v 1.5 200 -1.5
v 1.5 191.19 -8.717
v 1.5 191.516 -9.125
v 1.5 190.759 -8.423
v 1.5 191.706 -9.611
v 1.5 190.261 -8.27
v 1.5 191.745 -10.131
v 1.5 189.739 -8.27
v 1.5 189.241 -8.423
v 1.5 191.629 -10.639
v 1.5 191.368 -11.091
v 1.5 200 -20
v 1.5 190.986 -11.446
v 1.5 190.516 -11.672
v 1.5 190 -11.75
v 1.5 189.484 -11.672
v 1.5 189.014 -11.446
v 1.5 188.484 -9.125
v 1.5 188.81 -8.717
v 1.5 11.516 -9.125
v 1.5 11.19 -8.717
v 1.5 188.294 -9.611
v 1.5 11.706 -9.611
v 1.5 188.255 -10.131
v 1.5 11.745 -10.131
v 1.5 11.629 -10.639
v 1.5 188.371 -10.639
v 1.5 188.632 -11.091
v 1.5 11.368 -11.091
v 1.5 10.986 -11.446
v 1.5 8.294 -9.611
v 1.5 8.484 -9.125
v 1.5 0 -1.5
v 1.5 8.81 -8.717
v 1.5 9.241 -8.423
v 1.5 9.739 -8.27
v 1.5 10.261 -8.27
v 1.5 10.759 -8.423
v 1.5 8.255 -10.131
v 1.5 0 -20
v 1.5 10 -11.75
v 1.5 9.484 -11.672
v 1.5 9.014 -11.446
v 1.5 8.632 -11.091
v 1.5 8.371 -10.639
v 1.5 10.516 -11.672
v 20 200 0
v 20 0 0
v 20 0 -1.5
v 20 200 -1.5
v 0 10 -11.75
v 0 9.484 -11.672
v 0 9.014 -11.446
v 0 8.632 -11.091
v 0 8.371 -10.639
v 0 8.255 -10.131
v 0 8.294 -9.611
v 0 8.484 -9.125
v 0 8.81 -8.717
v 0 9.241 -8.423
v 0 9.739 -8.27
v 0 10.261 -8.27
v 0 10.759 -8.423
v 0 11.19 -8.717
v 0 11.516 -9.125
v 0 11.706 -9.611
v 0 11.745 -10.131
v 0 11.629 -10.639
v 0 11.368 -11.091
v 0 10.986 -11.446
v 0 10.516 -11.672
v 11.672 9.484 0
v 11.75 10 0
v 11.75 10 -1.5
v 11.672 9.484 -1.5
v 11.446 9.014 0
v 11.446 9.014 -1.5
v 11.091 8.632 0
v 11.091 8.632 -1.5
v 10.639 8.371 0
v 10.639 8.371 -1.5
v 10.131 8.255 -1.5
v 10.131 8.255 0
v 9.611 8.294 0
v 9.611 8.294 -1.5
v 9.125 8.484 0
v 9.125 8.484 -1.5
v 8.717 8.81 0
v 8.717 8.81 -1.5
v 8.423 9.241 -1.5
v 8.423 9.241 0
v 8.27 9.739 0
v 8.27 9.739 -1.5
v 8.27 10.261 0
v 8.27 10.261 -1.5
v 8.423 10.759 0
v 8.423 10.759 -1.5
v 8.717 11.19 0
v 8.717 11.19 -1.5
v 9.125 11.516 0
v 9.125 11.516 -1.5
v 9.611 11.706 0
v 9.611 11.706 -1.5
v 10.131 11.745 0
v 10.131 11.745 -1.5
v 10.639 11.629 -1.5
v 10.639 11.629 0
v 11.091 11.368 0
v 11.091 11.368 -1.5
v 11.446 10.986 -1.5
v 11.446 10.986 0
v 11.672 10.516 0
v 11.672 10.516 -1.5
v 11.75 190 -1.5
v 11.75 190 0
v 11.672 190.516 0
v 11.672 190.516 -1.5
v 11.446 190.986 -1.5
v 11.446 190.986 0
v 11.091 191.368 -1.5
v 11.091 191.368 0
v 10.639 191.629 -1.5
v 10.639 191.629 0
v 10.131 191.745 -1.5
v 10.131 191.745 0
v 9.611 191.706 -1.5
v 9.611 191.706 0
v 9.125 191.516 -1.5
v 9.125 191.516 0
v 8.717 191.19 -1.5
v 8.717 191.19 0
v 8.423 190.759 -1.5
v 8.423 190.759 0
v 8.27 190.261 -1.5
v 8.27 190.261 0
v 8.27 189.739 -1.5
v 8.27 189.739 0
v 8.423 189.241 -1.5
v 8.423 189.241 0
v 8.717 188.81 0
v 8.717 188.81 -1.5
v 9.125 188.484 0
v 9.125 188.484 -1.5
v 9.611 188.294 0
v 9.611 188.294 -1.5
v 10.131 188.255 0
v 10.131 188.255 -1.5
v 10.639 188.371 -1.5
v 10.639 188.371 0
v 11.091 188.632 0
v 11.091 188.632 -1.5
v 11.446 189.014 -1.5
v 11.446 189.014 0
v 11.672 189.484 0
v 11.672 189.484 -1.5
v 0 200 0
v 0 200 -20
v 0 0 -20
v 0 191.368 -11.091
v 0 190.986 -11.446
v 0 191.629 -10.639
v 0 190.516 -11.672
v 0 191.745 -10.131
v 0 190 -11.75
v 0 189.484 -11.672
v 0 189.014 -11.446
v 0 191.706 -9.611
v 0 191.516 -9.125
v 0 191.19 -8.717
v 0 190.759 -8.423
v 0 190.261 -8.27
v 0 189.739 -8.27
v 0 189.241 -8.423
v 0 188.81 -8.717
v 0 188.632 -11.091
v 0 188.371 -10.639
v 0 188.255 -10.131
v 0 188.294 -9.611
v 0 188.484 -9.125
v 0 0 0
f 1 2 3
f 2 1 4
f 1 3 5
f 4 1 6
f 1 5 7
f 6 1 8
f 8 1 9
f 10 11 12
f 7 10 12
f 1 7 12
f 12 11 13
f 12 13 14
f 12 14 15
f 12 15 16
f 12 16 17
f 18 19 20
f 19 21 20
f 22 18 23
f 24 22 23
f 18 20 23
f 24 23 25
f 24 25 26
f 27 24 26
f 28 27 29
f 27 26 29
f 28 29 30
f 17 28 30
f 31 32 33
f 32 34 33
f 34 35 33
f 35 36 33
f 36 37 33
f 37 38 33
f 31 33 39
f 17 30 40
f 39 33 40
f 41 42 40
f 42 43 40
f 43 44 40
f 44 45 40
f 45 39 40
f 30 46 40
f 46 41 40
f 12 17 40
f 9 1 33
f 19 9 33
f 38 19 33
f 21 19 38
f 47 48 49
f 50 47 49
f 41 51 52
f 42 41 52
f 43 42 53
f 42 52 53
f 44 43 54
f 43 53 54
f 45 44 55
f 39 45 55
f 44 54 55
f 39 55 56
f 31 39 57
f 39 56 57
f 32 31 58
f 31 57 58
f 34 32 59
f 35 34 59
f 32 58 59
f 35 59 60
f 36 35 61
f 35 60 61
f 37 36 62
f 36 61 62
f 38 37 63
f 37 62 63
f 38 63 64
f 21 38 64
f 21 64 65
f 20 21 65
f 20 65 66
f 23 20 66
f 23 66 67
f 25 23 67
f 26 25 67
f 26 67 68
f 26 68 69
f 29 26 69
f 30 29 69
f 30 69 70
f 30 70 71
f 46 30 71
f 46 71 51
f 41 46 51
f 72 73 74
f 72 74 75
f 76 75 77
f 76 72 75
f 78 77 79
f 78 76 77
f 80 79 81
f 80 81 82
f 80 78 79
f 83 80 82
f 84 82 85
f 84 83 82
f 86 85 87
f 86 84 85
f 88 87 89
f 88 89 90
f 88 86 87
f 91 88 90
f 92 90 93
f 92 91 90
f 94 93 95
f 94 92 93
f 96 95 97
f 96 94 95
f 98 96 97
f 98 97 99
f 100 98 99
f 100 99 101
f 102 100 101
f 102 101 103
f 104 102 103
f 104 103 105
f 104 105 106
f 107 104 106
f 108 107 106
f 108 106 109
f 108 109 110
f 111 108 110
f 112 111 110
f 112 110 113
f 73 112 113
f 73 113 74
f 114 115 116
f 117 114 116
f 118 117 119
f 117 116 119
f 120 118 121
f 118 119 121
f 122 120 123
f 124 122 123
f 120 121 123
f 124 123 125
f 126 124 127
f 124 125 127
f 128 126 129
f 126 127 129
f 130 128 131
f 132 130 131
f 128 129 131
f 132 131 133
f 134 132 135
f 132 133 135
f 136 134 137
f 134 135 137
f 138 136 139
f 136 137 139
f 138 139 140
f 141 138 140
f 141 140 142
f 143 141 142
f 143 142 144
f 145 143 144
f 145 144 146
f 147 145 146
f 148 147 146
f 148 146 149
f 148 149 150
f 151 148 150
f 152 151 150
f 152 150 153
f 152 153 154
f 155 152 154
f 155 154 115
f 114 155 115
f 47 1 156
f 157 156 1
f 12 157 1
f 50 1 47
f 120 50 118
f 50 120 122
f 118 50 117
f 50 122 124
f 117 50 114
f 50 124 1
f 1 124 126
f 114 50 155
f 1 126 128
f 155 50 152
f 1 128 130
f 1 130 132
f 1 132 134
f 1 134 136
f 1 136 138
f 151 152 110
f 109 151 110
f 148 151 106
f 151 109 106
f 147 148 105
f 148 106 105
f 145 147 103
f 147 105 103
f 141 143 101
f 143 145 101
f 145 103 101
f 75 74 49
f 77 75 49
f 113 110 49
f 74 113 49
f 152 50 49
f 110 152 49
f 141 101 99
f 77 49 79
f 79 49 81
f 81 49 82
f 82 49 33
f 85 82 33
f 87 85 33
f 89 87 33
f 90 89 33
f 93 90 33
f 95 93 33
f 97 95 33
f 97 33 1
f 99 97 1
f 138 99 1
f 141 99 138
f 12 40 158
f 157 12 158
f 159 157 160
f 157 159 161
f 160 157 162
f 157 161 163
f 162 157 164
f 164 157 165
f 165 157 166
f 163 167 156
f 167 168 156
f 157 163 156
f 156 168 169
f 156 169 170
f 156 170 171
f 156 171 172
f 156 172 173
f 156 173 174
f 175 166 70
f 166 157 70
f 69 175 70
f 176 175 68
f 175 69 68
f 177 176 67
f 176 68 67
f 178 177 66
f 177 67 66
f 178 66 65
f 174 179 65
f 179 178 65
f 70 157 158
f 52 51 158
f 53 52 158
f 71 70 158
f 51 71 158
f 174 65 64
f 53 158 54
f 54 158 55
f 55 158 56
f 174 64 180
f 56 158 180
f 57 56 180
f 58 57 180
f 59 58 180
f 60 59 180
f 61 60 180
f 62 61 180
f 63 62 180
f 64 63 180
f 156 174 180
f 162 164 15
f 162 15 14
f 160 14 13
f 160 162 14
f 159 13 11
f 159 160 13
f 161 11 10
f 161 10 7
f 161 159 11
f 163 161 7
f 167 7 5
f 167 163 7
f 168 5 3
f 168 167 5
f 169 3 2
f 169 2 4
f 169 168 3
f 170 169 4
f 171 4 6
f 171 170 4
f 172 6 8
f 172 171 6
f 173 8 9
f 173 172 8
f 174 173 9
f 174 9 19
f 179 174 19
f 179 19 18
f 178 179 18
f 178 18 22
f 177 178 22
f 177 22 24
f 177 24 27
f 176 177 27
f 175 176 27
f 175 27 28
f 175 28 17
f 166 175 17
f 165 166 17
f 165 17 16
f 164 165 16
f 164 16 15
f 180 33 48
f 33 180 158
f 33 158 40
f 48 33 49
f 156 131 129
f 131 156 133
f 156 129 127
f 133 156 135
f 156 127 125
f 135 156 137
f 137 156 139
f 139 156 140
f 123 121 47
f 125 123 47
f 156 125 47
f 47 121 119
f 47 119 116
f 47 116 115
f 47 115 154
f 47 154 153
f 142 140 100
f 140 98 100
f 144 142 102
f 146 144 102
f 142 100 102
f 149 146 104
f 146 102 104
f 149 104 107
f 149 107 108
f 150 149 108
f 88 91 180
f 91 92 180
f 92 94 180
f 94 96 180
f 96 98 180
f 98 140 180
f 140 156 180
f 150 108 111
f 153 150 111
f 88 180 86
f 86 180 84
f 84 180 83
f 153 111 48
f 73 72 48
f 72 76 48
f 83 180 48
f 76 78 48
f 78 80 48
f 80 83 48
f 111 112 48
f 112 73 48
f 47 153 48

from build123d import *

# Parameters (mm, degrees)
EXTRUDE_1_DEPTH          = 200
CUT_EXTRUDE_1_REACH      = 203.99
SKETCH_2_R               = 1.75
MIRROR_2_COPY_1_REACH    = 203.99
MIRROR_2_COPY_1_SKETCH_R = 1.75


with BuildPart() as part:
    # Эскиз1 → Бобышка-Вытянуть1 (new body)
    with BuildSketch(Plane(origin=(0, 0, 0), x_dir=(1, 0, 0), z_dir=(0, 1, 0))):
        Polygon((0, 0), (20, 0), (20, 1.5), (1.5, 1.5), (1.5, 20), (0, 20), align=None)
    extrude(amount=EXTRUDE_1_DEPTH)

    # Эскиз2 → Вырез-Вытянуть1 (cut, up to next)
    with BuildSketch(Plane.XY, mode=Mode.PRIVATE) as cut_extrude_1_sk1:
        with Locations((10, 190)):
            Circle(SKETCH_2_R)
    cut_extrude_1_tool1 = extrude(cut_extrude_1_sk1.sketch, amount=-CUT_EXTRUDE_1_REACH, mode=Mode.PRIVATE) & part.part
    cut_extrude_1 = cut_extrude_1_tool1.solids().sort_by_distance((10, 190, 0))[0]
    add(cut_extrude_1, mode=Mode.SUBTRACT)

    # Зеркальное отражение1: Вырез-Вытянуть1 across plane
    add(cut_extrude_1.mirror(Plane(origin=(0, 0, 0), x_dir=(-0.7071067811865482, 0, 0.7071067811865468), z_dir=(-0.7071067811865468, 0, -0.7071067811865482))), mode=Mode.SUBTRACT)

    # Зеркальное отражение2: Вырез-Вытянуть1 across plane
    add(cut_extrude_1.mirror(Plane(origin=(0, 100, 0), x_dir=(0, 0, 1), z_dir=(0, -1, 0))), mode=Mode.SUBTRACT)

    # Зеркальное отражение2 copy 1 sketch → Зеркальное отражение2 copy 1 (cut, up to next)
    with BuildSketch(Plane(origin=(0, 200, 0), x_dir=(0, 0, -1), z_dir=(-1, 0, 0)), mode=Mode.PRIVATE) as mirror_2_copy_1_sk1:
        with Locations((10, 190)):
            Circle(MIRROR_2_COPY_1_SKETCH_R)
    mirror_2_copy_1_tool1 = extrude(mirror_2_copy_1_sk1.sketch, amount=-MIRROR_2_COPY_1_REACH, mode=Mode.PRIVATE) & part.part
    add(mirror_2_copy_1_tool1.solids().sort_by_distance((0, 10, -10))[0], mode=Mode.SUBTRACT)


solid = part.part
